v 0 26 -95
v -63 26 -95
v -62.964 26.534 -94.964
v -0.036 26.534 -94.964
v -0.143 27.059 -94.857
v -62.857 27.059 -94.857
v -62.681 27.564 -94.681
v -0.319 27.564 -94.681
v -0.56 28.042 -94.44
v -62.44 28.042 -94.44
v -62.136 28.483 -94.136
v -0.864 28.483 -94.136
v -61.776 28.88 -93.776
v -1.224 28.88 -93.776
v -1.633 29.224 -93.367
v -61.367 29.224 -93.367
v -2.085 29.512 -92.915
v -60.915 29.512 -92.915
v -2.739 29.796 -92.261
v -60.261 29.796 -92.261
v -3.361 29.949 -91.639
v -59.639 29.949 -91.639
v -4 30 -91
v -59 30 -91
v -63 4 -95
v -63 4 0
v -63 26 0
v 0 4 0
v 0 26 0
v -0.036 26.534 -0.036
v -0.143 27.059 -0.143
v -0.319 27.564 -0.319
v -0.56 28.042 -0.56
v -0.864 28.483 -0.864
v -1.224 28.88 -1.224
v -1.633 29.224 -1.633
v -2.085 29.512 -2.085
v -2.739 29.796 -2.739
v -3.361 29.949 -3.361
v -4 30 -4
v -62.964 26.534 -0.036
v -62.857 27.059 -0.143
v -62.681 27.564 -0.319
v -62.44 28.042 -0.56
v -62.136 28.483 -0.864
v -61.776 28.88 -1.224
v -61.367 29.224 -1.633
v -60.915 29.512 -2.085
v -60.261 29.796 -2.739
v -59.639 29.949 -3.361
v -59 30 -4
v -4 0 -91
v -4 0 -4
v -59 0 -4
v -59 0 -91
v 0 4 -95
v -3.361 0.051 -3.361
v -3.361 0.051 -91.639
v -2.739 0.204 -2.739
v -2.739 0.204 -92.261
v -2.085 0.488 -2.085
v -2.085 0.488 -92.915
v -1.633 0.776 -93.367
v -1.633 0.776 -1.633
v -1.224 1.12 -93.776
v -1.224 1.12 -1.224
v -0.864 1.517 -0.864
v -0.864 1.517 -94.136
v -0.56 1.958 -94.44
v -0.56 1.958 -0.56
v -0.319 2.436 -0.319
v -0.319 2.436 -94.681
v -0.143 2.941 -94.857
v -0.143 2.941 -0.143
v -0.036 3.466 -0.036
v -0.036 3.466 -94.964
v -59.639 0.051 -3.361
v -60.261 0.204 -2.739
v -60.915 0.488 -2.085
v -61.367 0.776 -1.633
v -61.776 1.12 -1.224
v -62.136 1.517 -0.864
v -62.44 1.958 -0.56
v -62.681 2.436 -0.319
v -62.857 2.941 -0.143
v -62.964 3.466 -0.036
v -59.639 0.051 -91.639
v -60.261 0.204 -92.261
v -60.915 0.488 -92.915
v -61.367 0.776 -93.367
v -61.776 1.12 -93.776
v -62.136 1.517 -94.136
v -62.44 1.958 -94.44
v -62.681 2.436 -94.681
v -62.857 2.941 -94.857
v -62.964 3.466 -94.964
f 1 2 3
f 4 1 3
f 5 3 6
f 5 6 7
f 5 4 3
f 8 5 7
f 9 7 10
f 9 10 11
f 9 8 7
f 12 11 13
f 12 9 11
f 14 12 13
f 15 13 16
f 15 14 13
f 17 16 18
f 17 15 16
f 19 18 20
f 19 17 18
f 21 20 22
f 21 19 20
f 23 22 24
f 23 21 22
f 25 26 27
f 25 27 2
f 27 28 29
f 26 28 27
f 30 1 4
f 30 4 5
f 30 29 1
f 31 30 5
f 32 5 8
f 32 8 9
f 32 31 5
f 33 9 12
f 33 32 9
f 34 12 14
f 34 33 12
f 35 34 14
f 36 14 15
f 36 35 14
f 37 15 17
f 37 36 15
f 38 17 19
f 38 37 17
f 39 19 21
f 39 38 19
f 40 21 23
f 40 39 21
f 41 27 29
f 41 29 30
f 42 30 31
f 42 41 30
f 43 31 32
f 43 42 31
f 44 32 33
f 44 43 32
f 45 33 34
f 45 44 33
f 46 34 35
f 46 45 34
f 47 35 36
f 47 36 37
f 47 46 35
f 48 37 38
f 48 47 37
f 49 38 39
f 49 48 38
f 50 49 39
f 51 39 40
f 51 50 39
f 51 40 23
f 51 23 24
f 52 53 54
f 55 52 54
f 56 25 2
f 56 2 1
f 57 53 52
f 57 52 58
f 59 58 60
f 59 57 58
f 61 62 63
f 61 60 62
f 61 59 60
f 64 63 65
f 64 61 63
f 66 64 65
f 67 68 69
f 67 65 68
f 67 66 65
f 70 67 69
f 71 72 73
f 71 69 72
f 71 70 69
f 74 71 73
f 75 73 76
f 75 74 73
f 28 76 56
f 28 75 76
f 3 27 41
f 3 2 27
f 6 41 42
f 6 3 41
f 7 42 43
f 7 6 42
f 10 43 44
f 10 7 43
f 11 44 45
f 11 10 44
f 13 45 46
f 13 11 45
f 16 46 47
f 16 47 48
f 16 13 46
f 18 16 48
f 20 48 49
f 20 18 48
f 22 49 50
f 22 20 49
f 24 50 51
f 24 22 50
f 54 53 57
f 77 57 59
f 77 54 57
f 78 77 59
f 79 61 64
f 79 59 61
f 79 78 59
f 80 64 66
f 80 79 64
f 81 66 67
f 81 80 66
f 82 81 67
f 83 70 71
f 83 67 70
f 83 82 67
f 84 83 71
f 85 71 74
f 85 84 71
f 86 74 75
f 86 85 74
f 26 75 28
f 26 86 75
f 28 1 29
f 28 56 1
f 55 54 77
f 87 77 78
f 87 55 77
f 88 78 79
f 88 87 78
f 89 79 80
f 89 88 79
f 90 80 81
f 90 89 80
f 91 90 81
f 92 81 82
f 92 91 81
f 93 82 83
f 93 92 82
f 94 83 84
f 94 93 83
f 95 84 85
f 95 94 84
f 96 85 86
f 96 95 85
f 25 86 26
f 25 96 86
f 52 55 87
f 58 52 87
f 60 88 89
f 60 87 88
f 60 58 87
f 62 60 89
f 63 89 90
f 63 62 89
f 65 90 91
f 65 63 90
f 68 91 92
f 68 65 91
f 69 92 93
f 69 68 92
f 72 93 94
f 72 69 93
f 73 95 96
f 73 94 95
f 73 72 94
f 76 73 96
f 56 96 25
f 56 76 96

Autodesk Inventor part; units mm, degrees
ref_plane "YZ Plane" through (0, 0, 0) normal (1, 0, 0) x (0, 1, 0)
ref_plane "XZ Plane" through (0, 0, 0) normal (0, 1, 0) x (-1, 0, 0)
ref_plane "XY Plane" through (0, 0, 0) normal (0, 0, 1) x (1, 0, 0)
sketch "Sketch1" plane through (0, 0, 0) normal (0, 1, 0) x (-1, 0, 0)
  point P0 (0, 0)
sketch "Sketch2" plane through (0, 0, 0) normal (0, 1, 0) x (-1, 0, 0)
  point P0 (0, 0)
sketch "Sketch3" plane through (0, 0, 0) normal (0, 1, 0) x (-1, 0, 0)
  line L0 (0, 0) -> (63, 0)
  line L1 (63, 0) -> (63, -95)
  line L2 (63, -95) -> (0, -95)
  line L3 (0, -95) -> (0, 0)
  dimension "d0" = 63
  dimension "d1" = 95
extrude "Extrusion1" add sketch "Sketch3" along normal blind 30
fillet "Fillet1" radius 4 8 edges at (-31.5, 30, 0) (0, 30, -47.5) (-63, 30, -47.5) (-31.5, 30, -95) (0, 0, -47.5) (-31.5, 0, 0) (-31.5, 0, -95) (-63, 0, -47.5)
properties part number "pi"
